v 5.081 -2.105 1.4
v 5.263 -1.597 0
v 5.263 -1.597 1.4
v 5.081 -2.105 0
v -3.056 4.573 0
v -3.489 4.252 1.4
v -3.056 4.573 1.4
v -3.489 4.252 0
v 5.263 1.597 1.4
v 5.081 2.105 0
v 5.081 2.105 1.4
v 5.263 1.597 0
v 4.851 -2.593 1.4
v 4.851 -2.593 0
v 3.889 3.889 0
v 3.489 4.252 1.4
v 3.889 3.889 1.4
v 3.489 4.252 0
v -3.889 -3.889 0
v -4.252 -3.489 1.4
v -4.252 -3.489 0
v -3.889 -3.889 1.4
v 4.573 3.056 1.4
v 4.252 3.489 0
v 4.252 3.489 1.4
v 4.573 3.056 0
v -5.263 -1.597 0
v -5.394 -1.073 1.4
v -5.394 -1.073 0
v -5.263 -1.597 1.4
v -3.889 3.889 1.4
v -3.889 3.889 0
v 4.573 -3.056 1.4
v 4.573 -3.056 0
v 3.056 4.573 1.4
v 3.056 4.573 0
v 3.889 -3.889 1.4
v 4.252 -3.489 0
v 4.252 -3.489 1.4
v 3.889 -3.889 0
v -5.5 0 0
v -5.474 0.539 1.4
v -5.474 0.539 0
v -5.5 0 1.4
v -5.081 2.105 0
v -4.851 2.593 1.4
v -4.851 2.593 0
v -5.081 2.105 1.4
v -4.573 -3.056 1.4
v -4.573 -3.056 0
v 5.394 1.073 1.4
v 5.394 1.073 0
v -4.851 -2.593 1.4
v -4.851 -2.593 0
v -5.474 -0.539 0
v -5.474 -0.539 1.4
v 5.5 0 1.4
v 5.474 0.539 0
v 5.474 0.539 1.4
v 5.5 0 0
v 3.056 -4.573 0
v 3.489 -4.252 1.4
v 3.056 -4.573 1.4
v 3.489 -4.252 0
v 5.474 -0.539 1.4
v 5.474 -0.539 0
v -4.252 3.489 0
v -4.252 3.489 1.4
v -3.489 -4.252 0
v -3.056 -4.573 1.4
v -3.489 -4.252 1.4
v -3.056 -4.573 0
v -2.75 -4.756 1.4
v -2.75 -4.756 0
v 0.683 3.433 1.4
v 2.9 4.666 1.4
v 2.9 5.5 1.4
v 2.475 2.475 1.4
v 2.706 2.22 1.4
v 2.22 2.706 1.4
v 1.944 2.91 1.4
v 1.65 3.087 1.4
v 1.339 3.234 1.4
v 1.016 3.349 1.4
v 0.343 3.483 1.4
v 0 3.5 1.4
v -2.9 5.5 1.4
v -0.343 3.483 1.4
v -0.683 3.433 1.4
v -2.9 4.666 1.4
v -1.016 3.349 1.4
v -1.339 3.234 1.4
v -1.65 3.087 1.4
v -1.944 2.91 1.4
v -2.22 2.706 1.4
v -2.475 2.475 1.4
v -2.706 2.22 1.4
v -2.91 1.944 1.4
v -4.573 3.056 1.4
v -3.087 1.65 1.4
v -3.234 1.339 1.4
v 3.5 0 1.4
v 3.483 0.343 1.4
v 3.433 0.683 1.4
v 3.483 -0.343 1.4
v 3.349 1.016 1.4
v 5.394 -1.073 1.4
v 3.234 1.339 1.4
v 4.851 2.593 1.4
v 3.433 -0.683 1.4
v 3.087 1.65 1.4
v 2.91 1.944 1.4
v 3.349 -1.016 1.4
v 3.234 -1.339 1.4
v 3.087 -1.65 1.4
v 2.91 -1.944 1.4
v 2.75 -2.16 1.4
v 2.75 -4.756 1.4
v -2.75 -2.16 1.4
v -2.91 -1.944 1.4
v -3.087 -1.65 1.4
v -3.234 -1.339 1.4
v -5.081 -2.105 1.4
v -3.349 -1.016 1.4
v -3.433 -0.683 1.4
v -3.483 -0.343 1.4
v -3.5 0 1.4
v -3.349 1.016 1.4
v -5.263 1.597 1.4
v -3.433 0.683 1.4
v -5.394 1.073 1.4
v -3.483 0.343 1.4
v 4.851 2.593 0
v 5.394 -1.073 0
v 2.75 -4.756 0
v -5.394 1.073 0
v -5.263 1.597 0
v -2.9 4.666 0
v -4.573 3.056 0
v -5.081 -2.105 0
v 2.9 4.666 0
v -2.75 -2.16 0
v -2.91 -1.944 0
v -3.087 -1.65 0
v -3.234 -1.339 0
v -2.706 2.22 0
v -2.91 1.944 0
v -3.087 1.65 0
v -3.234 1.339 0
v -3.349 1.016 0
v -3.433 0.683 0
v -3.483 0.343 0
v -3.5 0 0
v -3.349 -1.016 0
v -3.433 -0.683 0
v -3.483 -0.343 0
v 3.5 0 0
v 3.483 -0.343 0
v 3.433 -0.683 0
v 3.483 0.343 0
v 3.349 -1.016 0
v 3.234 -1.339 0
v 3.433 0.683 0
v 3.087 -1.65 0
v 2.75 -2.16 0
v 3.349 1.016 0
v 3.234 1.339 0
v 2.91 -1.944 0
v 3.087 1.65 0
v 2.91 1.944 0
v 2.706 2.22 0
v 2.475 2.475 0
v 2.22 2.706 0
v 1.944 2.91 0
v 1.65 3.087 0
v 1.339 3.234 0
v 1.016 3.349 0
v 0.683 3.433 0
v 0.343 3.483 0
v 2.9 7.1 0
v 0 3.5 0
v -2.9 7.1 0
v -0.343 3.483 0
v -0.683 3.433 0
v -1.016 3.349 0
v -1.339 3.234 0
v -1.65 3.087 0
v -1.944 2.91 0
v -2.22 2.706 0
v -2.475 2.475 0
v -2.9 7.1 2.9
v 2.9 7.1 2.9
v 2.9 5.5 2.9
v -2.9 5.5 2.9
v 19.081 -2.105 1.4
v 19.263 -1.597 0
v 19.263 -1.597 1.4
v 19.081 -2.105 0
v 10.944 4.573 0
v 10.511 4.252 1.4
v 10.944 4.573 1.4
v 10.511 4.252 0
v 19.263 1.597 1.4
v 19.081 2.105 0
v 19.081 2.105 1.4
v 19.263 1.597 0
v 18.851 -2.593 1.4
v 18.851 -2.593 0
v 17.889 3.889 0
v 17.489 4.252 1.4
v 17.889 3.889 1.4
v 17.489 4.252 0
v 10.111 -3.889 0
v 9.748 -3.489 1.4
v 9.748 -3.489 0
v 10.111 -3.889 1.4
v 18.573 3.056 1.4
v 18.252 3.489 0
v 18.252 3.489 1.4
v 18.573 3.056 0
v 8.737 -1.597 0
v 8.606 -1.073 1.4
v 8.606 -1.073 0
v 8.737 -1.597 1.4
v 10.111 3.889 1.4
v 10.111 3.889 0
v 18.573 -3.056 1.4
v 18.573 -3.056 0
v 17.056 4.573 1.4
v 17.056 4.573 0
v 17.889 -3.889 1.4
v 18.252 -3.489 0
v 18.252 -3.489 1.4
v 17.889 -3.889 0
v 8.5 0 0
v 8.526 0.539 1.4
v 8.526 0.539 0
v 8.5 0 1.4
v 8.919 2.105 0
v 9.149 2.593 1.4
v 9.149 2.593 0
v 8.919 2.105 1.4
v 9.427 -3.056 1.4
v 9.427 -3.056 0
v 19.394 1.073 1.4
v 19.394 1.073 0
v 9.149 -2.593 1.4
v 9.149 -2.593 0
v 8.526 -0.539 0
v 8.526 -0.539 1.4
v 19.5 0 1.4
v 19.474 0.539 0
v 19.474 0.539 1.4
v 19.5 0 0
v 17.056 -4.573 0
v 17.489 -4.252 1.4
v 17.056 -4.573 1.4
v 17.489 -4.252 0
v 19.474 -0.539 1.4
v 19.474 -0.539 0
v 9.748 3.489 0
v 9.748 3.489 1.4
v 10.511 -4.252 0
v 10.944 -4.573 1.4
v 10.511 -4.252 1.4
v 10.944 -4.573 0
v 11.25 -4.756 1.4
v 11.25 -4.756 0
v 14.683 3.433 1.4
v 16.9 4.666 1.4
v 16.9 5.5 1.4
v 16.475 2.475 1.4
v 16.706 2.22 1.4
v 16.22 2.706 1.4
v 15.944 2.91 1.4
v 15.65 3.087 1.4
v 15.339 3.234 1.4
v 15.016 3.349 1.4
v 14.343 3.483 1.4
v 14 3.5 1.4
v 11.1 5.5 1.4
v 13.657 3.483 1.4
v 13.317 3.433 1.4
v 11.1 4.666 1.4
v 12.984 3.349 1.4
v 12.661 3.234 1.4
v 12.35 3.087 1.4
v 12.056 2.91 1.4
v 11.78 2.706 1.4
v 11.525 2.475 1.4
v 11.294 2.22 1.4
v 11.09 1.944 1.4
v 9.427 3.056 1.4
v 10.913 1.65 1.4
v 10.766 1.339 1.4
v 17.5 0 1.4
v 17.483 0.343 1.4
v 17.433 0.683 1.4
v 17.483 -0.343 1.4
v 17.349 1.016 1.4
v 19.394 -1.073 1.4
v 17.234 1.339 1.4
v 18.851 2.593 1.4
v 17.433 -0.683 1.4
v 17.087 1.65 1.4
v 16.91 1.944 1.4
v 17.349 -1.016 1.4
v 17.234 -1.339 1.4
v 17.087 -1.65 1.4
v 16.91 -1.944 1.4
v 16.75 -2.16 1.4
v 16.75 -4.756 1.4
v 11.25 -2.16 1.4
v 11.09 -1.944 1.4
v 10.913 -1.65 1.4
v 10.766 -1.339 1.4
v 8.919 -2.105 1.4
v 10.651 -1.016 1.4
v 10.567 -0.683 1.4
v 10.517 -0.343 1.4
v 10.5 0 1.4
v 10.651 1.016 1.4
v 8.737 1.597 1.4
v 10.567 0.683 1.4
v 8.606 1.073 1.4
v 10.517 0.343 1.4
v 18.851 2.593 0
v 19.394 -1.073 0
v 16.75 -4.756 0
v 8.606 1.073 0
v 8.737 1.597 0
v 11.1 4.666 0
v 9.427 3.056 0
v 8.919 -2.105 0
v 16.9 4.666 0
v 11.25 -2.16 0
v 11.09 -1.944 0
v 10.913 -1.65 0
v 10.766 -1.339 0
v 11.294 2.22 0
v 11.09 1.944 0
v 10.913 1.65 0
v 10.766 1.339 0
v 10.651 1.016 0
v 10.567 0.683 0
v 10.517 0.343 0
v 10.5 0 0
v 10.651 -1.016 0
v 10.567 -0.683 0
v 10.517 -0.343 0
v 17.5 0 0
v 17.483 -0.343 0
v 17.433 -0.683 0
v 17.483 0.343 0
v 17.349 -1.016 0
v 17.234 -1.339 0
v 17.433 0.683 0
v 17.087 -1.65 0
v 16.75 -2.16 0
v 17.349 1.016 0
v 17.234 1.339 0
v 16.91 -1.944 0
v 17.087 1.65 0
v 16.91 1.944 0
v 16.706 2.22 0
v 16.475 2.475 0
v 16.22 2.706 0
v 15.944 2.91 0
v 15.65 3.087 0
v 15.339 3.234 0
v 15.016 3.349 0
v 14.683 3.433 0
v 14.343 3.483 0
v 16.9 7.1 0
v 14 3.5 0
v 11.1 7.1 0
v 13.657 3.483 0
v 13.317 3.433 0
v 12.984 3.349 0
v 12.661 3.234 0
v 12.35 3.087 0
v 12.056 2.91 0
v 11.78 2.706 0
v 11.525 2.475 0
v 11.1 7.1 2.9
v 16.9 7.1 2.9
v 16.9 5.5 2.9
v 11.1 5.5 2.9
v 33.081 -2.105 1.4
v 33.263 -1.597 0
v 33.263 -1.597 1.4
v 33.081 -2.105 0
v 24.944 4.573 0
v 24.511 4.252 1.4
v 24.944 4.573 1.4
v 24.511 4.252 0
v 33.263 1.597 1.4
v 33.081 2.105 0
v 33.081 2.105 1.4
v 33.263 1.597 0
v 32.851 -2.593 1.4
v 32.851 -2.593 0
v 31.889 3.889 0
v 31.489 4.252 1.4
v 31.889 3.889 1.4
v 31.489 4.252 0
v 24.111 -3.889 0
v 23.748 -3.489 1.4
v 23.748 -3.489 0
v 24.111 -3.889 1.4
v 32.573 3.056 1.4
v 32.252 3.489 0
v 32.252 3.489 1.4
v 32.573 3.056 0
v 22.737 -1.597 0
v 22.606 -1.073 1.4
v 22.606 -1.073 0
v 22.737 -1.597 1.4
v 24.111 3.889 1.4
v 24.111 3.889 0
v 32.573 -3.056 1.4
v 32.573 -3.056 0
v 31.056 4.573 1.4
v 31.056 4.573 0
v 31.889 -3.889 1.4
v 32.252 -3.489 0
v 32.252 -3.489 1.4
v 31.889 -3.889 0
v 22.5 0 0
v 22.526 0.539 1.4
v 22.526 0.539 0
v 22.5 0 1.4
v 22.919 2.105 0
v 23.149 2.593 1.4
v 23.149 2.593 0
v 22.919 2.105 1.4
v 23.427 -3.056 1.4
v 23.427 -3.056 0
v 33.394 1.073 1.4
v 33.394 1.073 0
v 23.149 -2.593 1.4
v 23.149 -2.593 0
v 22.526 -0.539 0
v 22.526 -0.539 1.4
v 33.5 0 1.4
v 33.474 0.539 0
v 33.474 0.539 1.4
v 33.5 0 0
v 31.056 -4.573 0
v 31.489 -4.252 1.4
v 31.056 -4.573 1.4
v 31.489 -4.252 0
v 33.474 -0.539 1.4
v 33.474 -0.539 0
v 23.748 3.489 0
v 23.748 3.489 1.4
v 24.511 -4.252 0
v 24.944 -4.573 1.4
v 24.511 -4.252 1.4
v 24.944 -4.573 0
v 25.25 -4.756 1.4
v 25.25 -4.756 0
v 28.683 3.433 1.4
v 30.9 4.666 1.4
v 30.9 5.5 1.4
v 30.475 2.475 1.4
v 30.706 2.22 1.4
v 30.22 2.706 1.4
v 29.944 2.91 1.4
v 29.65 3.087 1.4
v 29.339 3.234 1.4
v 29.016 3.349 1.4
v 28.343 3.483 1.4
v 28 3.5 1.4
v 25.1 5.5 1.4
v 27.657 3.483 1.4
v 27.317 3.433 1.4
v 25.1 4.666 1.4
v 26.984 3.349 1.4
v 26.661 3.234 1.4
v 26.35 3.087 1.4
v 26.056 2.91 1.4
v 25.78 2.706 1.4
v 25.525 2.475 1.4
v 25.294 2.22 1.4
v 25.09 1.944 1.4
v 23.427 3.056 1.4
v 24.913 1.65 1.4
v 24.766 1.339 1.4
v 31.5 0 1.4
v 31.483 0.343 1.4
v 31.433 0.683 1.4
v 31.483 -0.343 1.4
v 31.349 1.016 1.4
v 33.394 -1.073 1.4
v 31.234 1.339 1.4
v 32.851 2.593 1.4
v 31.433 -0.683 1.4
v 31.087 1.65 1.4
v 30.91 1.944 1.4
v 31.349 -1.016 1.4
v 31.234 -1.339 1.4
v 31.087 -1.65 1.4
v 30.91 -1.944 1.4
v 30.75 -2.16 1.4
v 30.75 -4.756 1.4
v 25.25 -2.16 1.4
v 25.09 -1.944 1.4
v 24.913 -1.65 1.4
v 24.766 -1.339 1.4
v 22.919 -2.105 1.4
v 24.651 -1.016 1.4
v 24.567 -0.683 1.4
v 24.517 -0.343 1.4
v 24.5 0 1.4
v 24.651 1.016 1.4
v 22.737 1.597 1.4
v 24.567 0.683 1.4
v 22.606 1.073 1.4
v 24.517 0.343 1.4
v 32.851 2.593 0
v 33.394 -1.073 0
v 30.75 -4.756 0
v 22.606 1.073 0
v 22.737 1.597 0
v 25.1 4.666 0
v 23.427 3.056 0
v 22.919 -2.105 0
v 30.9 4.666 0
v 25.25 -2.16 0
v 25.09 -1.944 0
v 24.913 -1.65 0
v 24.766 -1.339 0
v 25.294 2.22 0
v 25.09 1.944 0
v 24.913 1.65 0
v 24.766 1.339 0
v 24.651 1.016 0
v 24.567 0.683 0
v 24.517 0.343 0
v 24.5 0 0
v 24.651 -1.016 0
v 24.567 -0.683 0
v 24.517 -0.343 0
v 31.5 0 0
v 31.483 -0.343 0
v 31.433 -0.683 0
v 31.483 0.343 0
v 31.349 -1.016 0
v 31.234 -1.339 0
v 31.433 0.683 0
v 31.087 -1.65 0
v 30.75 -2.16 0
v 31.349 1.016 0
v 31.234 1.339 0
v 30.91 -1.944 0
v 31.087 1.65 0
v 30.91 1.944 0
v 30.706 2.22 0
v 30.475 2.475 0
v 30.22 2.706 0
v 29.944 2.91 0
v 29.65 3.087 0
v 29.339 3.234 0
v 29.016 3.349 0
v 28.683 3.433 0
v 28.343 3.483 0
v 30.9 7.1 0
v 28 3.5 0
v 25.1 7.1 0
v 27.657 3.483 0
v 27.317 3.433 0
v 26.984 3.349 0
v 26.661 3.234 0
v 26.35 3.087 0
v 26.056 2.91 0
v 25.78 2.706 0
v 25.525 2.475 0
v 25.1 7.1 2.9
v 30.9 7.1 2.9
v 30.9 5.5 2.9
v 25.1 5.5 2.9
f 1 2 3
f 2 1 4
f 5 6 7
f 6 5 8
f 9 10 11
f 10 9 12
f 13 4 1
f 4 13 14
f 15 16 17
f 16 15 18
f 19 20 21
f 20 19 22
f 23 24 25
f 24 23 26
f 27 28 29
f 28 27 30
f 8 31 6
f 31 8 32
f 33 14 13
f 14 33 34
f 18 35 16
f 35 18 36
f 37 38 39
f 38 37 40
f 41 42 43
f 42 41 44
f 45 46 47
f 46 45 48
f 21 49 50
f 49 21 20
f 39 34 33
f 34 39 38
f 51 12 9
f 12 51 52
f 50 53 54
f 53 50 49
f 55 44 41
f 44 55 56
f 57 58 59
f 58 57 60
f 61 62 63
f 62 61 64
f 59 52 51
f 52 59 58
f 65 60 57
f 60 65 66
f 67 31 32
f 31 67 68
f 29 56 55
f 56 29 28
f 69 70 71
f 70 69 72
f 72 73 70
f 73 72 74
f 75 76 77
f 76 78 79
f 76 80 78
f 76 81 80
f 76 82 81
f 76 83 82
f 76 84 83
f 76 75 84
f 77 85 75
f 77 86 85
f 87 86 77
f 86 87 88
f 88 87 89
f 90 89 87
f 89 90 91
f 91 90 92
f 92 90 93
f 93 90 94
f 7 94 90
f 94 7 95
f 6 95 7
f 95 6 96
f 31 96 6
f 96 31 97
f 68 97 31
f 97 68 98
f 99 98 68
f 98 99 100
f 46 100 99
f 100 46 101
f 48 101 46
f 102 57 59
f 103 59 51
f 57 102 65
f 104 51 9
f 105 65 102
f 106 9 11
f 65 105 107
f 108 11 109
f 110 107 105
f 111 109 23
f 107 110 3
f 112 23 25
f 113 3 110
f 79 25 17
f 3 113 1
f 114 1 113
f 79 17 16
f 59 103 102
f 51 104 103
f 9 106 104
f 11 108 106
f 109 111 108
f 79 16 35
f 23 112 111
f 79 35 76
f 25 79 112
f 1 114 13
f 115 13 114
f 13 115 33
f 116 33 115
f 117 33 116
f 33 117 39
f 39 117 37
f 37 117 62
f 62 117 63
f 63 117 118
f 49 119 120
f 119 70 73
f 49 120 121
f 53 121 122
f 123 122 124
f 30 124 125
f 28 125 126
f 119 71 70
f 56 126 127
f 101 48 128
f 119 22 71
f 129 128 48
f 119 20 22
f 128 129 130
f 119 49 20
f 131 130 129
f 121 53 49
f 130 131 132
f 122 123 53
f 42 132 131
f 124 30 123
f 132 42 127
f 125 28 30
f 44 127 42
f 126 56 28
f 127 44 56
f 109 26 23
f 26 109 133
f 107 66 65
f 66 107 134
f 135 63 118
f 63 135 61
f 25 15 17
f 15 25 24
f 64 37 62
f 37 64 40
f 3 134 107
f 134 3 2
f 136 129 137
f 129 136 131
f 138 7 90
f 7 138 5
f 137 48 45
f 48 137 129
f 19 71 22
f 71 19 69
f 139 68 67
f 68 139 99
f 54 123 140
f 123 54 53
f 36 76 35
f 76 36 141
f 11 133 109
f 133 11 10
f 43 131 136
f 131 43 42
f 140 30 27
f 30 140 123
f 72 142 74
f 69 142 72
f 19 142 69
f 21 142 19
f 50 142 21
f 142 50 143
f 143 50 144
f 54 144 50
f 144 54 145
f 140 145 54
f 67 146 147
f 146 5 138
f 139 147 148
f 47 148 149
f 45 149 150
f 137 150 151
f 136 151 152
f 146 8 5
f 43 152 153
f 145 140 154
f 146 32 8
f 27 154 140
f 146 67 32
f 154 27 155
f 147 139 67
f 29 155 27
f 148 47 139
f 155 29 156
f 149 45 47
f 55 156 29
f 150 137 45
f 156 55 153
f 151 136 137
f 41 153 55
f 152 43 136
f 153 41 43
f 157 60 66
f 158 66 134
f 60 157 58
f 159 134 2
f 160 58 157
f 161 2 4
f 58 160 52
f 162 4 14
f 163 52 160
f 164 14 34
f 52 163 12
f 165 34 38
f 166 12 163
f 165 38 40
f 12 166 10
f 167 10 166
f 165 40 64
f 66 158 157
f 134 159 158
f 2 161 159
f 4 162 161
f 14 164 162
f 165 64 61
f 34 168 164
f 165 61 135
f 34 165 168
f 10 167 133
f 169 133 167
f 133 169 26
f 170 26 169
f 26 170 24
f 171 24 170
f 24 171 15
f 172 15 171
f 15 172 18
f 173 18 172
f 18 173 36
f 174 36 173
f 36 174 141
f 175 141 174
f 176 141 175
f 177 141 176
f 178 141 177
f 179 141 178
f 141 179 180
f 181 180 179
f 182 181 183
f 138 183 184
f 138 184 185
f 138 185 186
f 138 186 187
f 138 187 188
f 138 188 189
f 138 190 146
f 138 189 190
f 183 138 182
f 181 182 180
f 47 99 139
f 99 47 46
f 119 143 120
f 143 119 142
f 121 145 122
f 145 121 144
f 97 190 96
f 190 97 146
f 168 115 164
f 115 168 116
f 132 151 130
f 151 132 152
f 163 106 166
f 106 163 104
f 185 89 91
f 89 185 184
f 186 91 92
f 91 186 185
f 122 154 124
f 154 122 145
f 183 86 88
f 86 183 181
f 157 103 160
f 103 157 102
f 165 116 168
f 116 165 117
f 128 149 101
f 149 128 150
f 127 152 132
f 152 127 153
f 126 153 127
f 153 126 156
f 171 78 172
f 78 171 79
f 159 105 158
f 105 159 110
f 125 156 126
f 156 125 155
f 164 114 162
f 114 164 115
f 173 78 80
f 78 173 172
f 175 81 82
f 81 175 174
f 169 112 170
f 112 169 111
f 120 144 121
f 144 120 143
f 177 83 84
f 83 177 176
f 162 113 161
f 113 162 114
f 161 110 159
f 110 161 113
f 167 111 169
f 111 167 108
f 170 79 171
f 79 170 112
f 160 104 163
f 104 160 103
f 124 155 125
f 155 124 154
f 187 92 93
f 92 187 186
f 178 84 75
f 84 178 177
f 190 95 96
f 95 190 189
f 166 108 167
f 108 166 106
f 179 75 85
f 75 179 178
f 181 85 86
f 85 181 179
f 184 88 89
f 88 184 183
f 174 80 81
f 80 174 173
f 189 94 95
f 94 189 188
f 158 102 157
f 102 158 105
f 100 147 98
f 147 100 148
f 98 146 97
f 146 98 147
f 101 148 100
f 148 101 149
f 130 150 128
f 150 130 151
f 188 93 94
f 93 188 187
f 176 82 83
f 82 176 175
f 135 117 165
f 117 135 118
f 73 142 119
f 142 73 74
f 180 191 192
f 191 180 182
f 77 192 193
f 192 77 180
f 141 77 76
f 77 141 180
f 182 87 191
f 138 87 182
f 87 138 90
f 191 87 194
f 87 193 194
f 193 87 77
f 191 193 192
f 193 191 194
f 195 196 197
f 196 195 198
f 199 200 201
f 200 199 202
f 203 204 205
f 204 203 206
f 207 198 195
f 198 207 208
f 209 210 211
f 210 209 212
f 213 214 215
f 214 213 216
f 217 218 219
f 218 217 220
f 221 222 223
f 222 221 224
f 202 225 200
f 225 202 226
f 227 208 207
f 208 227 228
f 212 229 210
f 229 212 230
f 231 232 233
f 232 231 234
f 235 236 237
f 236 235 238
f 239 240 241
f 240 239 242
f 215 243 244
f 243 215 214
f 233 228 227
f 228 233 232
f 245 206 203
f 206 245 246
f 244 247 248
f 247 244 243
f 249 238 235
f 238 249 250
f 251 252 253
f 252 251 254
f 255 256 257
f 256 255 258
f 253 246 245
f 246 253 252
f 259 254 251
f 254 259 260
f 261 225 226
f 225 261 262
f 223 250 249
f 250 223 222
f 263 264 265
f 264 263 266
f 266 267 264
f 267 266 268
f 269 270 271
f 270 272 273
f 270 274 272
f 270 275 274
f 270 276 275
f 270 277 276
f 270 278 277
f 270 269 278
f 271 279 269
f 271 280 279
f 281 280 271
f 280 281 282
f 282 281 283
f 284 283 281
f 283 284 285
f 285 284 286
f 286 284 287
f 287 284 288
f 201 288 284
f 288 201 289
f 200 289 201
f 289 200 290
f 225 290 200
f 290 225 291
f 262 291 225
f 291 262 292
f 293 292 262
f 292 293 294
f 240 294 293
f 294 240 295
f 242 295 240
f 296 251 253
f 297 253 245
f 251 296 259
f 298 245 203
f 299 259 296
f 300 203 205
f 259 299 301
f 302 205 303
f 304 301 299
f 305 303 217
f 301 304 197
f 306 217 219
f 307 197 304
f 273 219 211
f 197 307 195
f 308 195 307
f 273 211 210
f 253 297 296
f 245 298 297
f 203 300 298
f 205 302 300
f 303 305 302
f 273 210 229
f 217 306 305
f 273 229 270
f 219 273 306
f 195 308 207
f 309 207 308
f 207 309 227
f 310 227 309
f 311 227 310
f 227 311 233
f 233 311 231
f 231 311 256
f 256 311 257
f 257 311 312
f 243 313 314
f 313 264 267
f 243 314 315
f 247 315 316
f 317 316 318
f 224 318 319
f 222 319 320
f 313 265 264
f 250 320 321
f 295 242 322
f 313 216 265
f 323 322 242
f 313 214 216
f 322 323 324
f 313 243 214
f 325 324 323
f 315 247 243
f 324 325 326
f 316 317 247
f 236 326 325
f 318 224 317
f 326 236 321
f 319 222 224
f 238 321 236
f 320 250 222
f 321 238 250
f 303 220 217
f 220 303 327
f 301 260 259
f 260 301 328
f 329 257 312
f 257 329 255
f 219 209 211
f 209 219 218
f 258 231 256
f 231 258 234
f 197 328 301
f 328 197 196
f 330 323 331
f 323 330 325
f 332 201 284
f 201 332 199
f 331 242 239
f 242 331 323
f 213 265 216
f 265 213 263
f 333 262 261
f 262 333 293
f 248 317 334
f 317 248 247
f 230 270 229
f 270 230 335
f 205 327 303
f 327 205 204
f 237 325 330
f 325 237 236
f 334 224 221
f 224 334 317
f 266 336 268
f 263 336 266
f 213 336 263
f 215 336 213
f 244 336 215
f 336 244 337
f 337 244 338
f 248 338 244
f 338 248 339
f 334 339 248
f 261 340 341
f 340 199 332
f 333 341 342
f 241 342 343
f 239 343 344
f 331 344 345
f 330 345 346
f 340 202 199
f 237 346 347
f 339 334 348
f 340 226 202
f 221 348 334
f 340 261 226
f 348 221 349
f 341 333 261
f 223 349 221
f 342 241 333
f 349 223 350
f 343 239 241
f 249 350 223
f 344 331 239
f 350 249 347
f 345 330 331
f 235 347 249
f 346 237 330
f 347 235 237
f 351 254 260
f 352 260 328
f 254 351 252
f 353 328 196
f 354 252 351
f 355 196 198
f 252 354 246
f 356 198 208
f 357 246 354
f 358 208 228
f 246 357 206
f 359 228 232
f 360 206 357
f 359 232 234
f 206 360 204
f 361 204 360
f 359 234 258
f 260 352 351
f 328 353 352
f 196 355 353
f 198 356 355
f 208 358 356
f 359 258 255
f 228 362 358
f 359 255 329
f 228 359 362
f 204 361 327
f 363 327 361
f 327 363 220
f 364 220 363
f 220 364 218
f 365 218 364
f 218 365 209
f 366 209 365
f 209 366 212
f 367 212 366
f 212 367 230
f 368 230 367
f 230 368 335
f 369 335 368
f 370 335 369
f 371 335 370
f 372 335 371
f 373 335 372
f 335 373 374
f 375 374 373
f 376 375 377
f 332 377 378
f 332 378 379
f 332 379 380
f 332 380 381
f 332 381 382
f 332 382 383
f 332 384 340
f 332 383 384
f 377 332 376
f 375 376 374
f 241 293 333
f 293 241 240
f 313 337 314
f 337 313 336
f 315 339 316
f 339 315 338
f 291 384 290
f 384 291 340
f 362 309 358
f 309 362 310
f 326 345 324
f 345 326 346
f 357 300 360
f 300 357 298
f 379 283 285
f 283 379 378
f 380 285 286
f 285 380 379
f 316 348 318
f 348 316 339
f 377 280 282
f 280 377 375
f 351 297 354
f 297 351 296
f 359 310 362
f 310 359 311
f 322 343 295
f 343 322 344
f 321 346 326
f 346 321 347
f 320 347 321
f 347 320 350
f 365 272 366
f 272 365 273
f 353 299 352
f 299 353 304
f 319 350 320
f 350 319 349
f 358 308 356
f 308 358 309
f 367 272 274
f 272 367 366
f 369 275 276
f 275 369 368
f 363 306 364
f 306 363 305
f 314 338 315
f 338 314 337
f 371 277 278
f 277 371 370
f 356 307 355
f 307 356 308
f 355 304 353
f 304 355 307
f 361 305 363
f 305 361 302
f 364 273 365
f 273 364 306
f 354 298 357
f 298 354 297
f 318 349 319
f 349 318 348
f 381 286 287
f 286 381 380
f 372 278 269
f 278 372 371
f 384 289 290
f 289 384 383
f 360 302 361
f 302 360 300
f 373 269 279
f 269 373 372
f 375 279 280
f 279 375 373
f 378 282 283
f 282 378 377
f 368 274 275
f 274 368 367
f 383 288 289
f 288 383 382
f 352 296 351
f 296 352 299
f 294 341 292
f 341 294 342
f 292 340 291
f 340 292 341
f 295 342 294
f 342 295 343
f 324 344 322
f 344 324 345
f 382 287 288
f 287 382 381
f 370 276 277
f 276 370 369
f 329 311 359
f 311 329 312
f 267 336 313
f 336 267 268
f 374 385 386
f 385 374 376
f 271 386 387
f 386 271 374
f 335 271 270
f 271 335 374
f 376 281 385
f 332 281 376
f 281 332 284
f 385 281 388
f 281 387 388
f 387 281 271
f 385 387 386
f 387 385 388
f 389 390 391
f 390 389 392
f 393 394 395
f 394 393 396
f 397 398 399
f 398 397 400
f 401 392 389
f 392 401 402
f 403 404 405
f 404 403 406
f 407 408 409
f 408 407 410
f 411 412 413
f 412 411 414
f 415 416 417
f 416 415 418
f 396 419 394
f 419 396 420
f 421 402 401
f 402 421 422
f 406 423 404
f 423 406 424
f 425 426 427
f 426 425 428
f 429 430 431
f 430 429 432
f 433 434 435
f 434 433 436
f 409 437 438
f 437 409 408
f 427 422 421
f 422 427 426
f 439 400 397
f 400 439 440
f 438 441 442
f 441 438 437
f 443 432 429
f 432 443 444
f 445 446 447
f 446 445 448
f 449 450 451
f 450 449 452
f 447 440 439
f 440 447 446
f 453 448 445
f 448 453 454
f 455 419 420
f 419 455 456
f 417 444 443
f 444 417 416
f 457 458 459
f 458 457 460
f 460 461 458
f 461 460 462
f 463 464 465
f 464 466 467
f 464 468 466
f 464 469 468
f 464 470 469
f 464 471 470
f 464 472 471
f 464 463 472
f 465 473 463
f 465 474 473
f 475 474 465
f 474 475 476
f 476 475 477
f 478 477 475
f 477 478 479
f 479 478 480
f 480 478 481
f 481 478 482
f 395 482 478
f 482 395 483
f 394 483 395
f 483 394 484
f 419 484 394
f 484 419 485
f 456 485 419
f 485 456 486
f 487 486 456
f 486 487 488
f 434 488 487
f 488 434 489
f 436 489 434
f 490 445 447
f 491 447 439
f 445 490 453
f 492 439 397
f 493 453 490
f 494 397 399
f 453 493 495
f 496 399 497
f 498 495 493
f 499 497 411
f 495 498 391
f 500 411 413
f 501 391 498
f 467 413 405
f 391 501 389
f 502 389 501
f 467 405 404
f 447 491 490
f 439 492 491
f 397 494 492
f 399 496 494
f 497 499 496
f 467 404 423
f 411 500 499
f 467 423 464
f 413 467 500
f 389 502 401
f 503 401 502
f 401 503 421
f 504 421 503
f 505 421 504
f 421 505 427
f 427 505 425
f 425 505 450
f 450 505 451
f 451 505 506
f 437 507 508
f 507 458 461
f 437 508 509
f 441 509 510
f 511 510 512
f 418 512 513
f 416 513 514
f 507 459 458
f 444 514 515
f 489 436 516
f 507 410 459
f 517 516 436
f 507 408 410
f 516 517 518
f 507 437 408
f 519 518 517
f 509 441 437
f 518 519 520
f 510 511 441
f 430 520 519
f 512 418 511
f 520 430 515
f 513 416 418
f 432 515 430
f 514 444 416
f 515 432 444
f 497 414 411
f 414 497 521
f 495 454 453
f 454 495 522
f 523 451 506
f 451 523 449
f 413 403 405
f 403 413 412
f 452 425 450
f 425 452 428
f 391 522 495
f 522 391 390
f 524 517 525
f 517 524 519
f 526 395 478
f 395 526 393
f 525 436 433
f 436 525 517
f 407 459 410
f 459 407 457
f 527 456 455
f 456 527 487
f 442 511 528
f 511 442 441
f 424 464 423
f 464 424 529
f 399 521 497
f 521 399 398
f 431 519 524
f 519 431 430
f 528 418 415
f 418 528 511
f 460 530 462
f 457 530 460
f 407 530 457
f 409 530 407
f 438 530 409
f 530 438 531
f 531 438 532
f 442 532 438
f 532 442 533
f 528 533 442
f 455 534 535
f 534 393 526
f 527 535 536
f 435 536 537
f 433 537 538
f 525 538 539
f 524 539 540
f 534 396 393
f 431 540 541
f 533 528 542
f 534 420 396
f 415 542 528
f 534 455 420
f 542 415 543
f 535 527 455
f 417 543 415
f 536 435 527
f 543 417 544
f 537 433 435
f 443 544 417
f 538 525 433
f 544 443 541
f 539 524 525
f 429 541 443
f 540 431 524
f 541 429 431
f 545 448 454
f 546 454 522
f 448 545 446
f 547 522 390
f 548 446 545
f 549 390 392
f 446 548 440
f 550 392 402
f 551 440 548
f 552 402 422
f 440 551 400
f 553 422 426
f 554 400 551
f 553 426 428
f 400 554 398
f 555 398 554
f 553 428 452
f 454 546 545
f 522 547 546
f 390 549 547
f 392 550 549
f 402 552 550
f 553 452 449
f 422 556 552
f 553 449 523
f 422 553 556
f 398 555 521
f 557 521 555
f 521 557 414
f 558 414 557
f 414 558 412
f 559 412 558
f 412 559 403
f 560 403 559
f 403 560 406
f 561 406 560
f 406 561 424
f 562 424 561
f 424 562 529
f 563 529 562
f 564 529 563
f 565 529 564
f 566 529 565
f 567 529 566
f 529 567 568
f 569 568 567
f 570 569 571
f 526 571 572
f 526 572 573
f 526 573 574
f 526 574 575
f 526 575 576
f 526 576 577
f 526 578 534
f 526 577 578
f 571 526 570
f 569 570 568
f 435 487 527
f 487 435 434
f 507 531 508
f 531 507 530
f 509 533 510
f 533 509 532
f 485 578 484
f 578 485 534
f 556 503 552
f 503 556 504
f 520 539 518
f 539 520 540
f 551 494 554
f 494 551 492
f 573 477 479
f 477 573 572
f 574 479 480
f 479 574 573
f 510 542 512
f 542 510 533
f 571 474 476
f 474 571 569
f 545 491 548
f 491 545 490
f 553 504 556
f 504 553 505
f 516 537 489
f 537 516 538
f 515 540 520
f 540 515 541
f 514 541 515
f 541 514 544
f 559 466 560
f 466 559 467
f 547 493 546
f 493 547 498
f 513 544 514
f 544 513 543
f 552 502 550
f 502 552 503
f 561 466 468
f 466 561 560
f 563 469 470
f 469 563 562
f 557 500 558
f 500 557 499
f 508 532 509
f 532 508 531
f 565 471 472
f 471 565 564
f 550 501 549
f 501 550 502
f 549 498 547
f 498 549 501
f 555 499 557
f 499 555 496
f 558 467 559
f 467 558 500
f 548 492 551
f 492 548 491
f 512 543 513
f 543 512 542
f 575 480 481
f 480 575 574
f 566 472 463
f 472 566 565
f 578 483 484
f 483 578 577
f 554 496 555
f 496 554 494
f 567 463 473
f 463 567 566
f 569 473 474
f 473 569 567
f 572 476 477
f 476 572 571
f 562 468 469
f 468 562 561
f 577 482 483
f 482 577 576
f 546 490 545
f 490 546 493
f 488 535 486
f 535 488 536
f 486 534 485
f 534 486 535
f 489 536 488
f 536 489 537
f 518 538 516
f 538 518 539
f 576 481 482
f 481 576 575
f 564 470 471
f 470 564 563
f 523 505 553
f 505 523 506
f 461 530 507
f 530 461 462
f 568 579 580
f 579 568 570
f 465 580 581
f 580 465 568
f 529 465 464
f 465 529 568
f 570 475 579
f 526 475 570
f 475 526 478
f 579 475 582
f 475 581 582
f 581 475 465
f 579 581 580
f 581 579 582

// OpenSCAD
// 3D printer Bowden clip customizer.

// How many clips to print.
count = 3;

// Clip's thickness
//ring_thickness = 1.8;  // white
ring_thickness = 1.4;  // green

// Inner diameter of the clip
ring_id = 7;
// Outer diameter of the clip
ring_od = 11;
// Width of the clip's opening
ring_cut_width = 5.5;
// Width of the vertical tab.
tab_width = 5.8;
// Height of the vertical tab.
tab_height = 1.5;
// Thickness of the vertical tab.
tab_thickness = 1.6;
// Controls the distance between the vertical tab and the ring.. 
tab_offset = 0;


/* [Hidden] */

$fn = 64;
eps = 0.01;

module bowden_clip_tab() {
  ring_width = (ring_od - ring_id)/2;
  base_length = ring_width + tab_offset + tab_thickness;
  translate([-base_length-ring_id/2, -tab_width/2, 0]) 
    cube([base_length, tab_width, ring_thickness]);
  translate([-ring_od/2-tab_offset-tab_thickness, -tab_width/2, 0])
    cube([tab_thickness, tab_width, ring_thickness+tab_height]);
  
}

module bowden_clip_ring() {
  difference() {
    cylinder(d=ring_od, h=ring_thickness);
    translate([0, 0, -eps]) 
      cylinder(d=ring_id, h=ring_thickness+2*eps);
    translate([0, -ring_cut_width/2, -eps]) 
      cube([ring_od/2+eps, ring_cut_width, ring_thickness+2*eps]);
  }
}

module bowden_clip() {
  bowden_clip_ring();
  bowden_clip_tab();
}

for (i = [0 : count-1]) {
  translate([i*(ring_od + 3), 0, 0]) rotate([0, 0, -90]) bowden_clip(); 
}
